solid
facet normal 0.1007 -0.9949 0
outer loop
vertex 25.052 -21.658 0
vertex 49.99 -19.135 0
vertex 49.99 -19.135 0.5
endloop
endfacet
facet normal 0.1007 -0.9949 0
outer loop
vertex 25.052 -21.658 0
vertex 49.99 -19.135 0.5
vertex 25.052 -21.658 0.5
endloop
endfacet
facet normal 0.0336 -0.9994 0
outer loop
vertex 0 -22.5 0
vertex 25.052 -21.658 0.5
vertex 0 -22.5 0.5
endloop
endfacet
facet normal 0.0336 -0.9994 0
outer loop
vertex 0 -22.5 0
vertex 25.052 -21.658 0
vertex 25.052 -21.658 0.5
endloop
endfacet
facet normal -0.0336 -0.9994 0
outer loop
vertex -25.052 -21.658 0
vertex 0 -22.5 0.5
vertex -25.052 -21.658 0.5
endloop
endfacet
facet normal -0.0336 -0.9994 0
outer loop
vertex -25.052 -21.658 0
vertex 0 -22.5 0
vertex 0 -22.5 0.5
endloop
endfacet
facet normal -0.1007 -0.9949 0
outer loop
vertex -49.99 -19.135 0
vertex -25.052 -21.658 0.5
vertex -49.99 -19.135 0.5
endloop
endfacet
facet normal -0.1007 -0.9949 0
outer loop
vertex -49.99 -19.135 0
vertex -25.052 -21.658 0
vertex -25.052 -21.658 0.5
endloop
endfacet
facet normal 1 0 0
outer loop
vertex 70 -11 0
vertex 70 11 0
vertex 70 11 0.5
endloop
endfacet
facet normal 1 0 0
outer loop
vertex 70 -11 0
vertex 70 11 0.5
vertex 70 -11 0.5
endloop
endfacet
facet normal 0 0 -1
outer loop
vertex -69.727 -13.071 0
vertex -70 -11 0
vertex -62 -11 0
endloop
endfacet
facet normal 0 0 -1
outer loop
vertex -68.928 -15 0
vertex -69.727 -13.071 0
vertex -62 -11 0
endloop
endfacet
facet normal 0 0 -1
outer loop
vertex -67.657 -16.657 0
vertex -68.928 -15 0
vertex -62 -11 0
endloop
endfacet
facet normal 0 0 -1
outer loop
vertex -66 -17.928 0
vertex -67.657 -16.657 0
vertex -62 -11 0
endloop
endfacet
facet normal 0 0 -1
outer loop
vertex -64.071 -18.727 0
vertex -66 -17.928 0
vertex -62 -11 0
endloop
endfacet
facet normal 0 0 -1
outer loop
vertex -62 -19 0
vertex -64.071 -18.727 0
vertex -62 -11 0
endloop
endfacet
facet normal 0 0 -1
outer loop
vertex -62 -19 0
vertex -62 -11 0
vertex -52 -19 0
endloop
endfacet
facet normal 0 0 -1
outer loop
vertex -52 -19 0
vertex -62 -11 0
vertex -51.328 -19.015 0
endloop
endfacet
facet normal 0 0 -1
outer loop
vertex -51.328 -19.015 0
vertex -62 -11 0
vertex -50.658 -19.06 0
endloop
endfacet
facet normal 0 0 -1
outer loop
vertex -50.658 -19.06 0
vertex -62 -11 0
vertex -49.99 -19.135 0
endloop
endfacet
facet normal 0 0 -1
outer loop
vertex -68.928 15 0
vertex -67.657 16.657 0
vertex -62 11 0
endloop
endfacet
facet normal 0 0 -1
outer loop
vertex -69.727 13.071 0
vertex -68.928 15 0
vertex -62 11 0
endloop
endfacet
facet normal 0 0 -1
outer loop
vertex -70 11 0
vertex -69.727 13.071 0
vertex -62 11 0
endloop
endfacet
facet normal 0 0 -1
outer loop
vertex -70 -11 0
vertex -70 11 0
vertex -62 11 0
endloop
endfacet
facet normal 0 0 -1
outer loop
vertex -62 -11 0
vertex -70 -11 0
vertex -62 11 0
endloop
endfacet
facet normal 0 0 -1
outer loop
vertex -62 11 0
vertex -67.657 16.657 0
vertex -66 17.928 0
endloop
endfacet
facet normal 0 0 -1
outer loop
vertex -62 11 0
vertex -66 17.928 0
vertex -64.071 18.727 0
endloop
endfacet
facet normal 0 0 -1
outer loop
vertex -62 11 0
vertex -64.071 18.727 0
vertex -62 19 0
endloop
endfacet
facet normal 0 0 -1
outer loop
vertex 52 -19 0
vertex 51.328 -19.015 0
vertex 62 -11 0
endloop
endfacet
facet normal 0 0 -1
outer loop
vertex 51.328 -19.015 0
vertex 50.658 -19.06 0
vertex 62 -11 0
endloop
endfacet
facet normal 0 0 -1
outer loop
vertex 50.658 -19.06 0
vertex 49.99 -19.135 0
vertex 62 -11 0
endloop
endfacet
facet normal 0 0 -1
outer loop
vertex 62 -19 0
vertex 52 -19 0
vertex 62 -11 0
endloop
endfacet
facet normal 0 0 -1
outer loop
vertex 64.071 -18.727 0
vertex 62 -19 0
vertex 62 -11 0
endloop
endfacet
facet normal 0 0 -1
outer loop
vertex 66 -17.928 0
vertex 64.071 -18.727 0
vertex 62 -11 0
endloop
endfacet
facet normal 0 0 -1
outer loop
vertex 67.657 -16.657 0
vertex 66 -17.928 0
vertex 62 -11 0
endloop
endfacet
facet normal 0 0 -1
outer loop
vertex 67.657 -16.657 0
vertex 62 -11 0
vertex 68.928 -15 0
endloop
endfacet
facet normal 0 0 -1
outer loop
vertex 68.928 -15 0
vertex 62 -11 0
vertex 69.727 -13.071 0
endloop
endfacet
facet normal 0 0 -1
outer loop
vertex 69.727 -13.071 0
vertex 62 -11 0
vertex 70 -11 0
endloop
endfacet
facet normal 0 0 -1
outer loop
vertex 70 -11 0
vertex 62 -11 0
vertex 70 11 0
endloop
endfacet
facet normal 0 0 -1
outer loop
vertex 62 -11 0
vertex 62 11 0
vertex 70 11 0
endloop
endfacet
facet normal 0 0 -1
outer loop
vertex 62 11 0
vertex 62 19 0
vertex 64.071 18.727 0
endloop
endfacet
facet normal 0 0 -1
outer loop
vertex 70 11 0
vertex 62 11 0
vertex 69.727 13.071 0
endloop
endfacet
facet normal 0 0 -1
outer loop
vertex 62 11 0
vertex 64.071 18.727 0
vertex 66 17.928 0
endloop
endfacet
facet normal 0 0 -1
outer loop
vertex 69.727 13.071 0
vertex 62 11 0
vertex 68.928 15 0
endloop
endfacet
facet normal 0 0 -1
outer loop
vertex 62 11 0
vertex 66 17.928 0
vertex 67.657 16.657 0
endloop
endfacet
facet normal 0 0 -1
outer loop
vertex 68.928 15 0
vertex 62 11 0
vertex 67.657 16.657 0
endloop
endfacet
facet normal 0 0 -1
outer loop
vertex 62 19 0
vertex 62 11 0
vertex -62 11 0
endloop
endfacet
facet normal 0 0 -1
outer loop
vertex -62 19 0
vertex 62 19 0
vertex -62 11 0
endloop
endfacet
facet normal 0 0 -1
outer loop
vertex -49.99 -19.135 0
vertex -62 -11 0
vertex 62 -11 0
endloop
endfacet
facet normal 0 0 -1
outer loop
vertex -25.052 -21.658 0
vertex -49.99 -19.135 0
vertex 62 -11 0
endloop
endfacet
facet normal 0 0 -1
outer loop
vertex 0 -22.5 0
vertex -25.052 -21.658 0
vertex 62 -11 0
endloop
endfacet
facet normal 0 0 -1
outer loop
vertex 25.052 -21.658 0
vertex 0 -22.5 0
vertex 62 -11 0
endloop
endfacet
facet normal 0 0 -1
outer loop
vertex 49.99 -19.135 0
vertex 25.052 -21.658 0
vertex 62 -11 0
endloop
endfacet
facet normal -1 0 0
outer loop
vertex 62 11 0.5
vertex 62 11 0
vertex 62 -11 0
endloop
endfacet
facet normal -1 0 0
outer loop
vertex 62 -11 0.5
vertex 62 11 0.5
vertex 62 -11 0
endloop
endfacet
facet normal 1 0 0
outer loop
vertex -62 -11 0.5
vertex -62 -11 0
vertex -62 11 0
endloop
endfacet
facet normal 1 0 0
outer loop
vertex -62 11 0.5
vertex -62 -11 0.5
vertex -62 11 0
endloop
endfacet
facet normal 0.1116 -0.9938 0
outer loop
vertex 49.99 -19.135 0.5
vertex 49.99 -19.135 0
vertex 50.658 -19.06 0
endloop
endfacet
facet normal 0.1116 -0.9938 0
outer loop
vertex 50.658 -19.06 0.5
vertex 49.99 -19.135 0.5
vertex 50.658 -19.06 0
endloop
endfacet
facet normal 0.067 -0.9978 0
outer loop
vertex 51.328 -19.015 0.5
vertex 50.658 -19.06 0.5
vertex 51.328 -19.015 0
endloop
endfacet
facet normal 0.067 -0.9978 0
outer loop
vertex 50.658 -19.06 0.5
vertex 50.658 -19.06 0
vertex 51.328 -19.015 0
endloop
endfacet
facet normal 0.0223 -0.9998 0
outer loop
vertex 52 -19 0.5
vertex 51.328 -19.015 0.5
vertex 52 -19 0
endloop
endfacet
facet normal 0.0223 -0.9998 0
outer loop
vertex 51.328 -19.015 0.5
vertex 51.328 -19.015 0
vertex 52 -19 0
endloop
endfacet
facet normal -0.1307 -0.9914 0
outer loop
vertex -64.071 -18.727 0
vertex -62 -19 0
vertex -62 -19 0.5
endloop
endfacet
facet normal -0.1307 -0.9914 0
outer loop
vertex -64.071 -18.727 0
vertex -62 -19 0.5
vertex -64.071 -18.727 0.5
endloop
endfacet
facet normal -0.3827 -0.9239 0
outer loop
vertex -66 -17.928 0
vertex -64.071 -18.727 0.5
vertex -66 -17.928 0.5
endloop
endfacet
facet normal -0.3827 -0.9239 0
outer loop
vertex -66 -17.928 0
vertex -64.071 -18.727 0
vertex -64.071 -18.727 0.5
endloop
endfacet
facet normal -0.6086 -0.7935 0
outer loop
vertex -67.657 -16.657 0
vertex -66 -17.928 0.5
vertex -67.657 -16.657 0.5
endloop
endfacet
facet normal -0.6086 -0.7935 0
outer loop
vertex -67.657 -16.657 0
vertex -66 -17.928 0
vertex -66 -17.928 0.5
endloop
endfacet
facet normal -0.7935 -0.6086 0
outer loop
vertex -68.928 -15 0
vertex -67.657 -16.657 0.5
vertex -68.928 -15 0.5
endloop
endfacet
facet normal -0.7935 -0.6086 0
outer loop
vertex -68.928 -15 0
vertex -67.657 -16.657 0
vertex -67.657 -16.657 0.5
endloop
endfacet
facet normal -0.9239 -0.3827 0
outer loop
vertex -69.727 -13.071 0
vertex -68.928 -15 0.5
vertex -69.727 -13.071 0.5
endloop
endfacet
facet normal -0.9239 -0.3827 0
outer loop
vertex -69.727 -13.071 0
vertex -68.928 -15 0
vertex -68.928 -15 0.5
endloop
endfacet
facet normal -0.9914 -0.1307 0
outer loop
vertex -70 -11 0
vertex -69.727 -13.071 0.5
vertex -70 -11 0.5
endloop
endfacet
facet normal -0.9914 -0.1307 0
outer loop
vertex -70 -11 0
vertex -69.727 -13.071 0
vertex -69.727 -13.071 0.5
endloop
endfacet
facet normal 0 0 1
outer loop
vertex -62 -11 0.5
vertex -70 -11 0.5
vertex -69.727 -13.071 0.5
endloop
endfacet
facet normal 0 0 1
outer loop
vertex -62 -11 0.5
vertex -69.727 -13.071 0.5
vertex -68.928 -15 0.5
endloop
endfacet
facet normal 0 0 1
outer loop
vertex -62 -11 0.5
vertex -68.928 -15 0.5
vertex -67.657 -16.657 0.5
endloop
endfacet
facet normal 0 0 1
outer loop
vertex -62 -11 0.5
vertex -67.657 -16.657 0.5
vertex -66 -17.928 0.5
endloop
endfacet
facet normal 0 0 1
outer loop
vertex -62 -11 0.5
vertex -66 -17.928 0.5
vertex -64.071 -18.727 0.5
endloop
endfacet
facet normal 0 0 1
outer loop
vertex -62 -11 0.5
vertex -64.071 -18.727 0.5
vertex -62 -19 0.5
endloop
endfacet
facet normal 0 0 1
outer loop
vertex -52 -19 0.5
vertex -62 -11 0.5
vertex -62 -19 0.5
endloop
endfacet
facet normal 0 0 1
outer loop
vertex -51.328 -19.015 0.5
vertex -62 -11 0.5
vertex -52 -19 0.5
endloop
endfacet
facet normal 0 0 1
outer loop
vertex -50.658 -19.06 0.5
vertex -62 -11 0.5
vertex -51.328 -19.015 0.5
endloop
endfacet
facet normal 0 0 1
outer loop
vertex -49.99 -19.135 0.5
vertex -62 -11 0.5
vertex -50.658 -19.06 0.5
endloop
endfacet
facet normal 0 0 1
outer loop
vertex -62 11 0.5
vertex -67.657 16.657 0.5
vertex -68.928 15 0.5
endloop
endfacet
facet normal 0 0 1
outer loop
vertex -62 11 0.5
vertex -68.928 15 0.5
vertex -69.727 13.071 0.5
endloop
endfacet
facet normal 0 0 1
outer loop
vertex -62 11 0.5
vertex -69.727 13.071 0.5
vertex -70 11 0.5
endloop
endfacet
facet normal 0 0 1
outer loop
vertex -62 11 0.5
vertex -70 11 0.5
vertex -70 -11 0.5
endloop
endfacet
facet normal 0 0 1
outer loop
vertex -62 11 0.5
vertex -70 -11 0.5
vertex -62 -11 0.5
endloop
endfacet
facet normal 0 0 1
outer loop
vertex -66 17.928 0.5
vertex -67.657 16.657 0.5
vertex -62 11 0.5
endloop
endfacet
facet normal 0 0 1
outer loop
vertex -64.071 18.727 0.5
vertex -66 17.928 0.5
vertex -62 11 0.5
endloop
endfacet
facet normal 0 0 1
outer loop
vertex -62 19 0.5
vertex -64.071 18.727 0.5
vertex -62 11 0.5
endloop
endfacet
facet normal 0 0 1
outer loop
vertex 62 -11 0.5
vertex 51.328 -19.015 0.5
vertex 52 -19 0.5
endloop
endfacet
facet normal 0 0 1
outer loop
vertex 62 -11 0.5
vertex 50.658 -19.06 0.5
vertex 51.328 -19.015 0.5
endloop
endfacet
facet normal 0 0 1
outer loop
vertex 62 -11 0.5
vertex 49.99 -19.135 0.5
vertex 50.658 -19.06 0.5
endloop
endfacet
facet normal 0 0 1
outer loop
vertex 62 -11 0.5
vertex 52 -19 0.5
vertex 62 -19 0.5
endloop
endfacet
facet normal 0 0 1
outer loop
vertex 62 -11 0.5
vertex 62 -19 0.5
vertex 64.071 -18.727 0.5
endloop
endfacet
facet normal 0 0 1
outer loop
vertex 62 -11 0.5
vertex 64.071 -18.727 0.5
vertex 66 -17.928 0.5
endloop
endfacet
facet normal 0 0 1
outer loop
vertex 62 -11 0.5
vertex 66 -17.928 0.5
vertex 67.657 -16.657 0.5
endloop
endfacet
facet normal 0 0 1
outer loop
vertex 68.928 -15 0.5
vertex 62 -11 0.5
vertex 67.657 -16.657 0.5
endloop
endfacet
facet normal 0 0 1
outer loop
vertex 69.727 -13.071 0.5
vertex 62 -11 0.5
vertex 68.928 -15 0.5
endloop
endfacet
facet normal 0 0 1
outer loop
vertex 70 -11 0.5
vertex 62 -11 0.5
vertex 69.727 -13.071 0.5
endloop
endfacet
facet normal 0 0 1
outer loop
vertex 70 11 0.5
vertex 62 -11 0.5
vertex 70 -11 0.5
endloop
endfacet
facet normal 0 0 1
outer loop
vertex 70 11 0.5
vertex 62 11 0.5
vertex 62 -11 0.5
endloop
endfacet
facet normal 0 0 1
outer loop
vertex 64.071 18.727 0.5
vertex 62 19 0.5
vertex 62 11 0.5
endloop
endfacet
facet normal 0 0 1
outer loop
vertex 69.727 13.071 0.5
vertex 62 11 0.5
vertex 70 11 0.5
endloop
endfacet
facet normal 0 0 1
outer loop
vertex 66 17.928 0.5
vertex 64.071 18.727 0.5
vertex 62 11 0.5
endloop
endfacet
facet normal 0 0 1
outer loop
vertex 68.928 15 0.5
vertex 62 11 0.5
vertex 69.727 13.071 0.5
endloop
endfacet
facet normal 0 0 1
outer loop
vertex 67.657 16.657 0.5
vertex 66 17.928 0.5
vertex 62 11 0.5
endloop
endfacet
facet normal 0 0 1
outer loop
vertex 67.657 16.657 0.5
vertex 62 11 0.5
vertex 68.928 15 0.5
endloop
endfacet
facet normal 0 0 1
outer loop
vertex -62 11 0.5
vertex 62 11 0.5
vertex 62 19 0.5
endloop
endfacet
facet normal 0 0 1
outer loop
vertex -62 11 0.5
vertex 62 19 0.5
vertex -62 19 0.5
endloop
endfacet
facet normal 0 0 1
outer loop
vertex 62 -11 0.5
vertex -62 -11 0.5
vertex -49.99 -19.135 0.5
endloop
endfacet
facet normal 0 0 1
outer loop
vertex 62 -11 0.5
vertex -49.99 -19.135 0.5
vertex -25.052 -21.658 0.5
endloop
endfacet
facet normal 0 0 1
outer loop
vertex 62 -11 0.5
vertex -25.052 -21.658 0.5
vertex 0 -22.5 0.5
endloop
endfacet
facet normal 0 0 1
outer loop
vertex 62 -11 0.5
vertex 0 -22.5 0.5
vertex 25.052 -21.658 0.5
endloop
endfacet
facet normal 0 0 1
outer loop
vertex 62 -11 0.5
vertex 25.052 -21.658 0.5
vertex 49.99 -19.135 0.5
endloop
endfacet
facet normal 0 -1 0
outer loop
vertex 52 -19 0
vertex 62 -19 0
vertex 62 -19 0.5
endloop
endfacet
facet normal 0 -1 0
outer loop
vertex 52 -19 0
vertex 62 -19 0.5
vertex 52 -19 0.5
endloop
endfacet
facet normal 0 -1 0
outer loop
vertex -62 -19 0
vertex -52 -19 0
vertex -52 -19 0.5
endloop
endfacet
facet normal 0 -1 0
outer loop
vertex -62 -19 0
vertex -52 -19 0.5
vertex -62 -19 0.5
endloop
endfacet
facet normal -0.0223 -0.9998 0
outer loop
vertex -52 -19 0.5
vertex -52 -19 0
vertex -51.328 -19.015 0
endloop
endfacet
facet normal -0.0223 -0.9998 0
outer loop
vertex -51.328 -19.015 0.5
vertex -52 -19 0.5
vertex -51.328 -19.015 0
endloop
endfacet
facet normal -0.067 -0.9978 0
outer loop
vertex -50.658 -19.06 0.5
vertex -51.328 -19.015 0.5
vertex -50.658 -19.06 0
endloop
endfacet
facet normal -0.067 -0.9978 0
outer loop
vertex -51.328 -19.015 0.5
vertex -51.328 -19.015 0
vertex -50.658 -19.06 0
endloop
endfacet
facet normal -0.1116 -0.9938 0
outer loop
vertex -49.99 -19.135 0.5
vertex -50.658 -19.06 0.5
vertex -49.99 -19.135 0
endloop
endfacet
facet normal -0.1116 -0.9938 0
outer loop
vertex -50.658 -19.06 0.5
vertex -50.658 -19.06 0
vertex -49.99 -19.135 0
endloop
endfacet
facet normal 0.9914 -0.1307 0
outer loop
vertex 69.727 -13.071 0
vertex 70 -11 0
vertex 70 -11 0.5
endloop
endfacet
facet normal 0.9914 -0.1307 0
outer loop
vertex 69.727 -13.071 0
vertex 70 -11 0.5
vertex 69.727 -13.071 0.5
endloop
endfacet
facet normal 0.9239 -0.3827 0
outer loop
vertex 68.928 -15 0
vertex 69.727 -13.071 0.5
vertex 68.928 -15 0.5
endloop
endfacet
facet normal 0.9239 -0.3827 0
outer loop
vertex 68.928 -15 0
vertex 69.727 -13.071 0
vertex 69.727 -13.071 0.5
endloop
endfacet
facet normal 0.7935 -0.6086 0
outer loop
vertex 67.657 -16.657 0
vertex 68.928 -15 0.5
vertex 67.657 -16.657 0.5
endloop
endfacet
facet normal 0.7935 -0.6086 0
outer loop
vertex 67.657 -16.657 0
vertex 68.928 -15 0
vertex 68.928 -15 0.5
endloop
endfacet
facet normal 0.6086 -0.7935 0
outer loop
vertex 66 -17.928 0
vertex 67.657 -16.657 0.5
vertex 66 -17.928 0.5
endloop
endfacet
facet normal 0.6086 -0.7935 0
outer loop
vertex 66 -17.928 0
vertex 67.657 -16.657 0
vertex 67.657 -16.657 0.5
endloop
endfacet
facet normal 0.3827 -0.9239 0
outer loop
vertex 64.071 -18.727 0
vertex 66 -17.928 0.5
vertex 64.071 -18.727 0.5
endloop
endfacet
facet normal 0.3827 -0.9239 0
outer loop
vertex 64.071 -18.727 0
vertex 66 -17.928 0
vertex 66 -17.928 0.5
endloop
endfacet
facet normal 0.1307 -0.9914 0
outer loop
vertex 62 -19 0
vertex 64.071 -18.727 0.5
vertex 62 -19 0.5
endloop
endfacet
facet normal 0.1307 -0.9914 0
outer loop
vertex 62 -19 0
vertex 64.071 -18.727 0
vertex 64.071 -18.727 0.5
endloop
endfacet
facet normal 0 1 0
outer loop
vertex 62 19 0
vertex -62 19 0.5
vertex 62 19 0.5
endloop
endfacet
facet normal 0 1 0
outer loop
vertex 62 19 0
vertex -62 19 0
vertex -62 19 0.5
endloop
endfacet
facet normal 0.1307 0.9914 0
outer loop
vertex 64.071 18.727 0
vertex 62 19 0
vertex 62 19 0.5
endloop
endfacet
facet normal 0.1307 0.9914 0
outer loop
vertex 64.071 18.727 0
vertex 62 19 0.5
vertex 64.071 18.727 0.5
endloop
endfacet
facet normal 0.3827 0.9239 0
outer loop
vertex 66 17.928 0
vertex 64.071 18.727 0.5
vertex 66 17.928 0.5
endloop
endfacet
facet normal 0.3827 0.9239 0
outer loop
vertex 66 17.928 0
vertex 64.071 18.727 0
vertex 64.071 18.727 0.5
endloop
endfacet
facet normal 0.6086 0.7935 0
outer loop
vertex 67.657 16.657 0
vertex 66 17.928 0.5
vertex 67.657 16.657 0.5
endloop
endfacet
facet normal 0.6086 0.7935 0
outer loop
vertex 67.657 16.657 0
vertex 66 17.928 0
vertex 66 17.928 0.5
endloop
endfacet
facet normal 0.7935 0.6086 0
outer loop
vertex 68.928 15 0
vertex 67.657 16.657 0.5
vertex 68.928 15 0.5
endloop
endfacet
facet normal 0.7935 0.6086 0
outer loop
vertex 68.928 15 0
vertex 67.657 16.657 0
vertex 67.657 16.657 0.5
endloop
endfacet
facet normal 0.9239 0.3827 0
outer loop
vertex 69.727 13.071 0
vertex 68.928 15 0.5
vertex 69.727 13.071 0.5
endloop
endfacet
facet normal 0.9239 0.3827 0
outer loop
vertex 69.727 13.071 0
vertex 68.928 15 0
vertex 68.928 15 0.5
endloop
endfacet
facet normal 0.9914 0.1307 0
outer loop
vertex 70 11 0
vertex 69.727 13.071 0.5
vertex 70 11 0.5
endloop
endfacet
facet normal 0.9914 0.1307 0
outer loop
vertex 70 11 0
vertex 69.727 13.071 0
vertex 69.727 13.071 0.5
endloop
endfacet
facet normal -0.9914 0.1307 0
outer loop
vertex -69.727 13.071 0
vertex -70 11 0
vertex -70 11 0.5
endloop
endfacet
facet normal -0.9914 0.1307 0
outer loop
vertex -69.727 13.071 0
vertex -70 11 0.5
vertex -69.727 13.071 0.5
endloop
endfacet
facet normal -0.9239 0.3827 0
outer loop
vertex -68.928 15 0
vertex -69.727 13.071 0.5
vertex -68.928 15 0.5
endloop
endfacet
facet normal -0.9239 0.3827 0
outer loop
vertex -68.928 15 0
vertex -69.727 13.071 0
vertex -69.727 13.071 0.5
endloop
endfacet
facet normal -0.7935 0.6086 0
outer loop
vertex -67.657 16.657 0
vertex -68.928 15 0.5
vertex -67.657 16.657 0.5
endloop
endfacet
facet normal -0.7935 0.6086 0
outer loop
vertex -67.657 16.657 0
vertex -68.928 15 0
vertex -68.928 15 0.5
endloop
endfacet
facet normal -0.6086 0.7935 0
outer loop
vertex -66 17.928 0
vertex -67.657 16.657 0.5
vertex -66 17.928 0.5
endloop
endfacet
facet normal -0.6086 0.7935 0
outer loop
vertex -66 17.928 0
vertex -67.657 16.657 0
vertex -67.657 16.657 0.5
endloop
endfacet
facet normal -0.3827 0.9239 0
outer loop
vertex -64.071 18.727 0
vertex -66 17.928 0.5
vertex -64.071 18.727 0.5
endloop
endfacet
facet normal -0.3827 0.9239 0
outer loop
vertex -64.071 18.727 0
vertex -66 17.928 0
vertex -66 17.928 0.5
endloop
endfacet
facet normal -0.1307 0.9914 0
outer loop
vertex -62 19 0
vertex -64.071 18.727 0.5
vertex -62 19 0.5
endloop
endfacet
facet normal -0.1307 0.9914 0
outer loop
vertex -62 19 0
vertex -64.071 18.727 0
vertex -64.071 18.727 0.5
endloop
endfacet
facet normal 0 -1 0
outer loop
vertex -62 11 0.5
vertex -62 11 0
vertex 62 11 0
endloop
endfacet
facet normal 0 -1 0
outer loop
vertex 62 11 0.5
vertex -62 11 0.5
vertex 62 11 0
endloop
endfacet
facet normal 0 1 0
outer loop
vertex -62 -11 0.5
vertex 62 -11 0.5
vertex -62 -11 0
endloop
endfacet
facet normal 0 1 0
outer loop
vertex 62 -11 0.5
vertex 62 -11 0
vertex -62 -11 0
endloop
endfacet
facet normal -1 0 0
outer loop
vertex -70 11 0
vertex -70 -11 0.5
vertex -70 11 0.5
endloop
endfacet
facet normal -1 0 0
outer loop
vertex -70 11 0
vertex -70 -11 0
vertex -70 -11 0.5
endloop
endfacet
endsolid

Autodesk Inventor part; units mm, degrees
ref_plane "XZ Plane" through (0, 0, 0) normal (0, 1, 0) x (-1, 0, 0)
sketch "Sketch1" plane through (0, 0, 0) normal (0, 0, 1) x (1, 0, 0)
  line L0 (-62, 19) -> (62, 19)
  line L1 (70, 11) -> (70, -11)
  line L2 (62, -19) -> (-62, -19)
  line L3 (-70, -11) -> (-70, 11)
  arc A0 (70, 11) -> (62, 19) centre (62, 11) ccw
  arc A1 (62, -19) -> (70, -11) centre (62, -11) ccw
  arc A2 (-70, -11) -> (-62, -19) centre (-62, -11) ccw
  arc A3 (-62, 19) -> (-70, 11) centre (-62, 11) ccw
  point P0 (0, 0)
  dimension "d0" = 19
  dimension "d1" = 38
  dimension "d2" = 140
  dimension "d3" = 70
  dimension "d4" = 8
  dimension "d5" = 8
extrude "Extrusion1" add sketch "Sketch1" along normal blind 0.5
sketch "Sketch2" plane through (0, 0, 0) normal (0, 0, 1) x (1, 0, 0)
  arc A0 (-49.9899, -19.1353) -> (-52, -19) centre (-52, -34) ccw
  arc A1 (52, -19) -> (49.9899, -19.1353) centre (52, -34) ccw
  line L0 (52, -17) -> (52, -19)
  line L1 (70, -11) -> (70, 11) projected
  line L2 (-70, 11) -> (-70, -11) projected
  line L3 (-62, -19) -> (62, -19) projected
  line L4 (-52, -34) -> (-52, -17)
  line L5 (-52, -17) -> (52, -17)
  line L6 (52, -17) -> (52, -19)
  arc A2 (-49.9899, -19.1353) -> (49.9899, -19.1353) centre (0, 350.5357) ccw
  dimension "d24" = 30
  dimension "d25" = 30
  dimension "d26" = 18
  dimension "d27" = 15
  dimension "d28" = 15
  dimension "d30" = 2
  dimension "d31" = 18
  dimension "d32" = 5.5
extrude "Extrusion2" add sketch "Sketch2" along normal blind 0.5
sketch "Sketch3" plane through (0, 0, 0) normal (0, 0, 1) x (1, 0, 0)
  arc A0 (62, -19) -> (70, -11) centre (62, -11) ccw
  arc A1 (-62, 19) -> (-70, 11) centre (-62, 11) ccw
  line L0 (-62, 11) -> (62, 11)
  line L1 (62, 11) -> (62, -11)
  line L2 (62, -11) -> (-62, -11)
  line L3 (-62, -11) -> (-62, 11)
  point P0 (0, 0)
extrude "Extrusion3" cut sketch "Sketch3" along normal through all both and the other way through all
equation "\"d0\" = 0.5 * d1"
equation "\"d3\" = 0.5 * d2"
properties part number "frontprofile"
